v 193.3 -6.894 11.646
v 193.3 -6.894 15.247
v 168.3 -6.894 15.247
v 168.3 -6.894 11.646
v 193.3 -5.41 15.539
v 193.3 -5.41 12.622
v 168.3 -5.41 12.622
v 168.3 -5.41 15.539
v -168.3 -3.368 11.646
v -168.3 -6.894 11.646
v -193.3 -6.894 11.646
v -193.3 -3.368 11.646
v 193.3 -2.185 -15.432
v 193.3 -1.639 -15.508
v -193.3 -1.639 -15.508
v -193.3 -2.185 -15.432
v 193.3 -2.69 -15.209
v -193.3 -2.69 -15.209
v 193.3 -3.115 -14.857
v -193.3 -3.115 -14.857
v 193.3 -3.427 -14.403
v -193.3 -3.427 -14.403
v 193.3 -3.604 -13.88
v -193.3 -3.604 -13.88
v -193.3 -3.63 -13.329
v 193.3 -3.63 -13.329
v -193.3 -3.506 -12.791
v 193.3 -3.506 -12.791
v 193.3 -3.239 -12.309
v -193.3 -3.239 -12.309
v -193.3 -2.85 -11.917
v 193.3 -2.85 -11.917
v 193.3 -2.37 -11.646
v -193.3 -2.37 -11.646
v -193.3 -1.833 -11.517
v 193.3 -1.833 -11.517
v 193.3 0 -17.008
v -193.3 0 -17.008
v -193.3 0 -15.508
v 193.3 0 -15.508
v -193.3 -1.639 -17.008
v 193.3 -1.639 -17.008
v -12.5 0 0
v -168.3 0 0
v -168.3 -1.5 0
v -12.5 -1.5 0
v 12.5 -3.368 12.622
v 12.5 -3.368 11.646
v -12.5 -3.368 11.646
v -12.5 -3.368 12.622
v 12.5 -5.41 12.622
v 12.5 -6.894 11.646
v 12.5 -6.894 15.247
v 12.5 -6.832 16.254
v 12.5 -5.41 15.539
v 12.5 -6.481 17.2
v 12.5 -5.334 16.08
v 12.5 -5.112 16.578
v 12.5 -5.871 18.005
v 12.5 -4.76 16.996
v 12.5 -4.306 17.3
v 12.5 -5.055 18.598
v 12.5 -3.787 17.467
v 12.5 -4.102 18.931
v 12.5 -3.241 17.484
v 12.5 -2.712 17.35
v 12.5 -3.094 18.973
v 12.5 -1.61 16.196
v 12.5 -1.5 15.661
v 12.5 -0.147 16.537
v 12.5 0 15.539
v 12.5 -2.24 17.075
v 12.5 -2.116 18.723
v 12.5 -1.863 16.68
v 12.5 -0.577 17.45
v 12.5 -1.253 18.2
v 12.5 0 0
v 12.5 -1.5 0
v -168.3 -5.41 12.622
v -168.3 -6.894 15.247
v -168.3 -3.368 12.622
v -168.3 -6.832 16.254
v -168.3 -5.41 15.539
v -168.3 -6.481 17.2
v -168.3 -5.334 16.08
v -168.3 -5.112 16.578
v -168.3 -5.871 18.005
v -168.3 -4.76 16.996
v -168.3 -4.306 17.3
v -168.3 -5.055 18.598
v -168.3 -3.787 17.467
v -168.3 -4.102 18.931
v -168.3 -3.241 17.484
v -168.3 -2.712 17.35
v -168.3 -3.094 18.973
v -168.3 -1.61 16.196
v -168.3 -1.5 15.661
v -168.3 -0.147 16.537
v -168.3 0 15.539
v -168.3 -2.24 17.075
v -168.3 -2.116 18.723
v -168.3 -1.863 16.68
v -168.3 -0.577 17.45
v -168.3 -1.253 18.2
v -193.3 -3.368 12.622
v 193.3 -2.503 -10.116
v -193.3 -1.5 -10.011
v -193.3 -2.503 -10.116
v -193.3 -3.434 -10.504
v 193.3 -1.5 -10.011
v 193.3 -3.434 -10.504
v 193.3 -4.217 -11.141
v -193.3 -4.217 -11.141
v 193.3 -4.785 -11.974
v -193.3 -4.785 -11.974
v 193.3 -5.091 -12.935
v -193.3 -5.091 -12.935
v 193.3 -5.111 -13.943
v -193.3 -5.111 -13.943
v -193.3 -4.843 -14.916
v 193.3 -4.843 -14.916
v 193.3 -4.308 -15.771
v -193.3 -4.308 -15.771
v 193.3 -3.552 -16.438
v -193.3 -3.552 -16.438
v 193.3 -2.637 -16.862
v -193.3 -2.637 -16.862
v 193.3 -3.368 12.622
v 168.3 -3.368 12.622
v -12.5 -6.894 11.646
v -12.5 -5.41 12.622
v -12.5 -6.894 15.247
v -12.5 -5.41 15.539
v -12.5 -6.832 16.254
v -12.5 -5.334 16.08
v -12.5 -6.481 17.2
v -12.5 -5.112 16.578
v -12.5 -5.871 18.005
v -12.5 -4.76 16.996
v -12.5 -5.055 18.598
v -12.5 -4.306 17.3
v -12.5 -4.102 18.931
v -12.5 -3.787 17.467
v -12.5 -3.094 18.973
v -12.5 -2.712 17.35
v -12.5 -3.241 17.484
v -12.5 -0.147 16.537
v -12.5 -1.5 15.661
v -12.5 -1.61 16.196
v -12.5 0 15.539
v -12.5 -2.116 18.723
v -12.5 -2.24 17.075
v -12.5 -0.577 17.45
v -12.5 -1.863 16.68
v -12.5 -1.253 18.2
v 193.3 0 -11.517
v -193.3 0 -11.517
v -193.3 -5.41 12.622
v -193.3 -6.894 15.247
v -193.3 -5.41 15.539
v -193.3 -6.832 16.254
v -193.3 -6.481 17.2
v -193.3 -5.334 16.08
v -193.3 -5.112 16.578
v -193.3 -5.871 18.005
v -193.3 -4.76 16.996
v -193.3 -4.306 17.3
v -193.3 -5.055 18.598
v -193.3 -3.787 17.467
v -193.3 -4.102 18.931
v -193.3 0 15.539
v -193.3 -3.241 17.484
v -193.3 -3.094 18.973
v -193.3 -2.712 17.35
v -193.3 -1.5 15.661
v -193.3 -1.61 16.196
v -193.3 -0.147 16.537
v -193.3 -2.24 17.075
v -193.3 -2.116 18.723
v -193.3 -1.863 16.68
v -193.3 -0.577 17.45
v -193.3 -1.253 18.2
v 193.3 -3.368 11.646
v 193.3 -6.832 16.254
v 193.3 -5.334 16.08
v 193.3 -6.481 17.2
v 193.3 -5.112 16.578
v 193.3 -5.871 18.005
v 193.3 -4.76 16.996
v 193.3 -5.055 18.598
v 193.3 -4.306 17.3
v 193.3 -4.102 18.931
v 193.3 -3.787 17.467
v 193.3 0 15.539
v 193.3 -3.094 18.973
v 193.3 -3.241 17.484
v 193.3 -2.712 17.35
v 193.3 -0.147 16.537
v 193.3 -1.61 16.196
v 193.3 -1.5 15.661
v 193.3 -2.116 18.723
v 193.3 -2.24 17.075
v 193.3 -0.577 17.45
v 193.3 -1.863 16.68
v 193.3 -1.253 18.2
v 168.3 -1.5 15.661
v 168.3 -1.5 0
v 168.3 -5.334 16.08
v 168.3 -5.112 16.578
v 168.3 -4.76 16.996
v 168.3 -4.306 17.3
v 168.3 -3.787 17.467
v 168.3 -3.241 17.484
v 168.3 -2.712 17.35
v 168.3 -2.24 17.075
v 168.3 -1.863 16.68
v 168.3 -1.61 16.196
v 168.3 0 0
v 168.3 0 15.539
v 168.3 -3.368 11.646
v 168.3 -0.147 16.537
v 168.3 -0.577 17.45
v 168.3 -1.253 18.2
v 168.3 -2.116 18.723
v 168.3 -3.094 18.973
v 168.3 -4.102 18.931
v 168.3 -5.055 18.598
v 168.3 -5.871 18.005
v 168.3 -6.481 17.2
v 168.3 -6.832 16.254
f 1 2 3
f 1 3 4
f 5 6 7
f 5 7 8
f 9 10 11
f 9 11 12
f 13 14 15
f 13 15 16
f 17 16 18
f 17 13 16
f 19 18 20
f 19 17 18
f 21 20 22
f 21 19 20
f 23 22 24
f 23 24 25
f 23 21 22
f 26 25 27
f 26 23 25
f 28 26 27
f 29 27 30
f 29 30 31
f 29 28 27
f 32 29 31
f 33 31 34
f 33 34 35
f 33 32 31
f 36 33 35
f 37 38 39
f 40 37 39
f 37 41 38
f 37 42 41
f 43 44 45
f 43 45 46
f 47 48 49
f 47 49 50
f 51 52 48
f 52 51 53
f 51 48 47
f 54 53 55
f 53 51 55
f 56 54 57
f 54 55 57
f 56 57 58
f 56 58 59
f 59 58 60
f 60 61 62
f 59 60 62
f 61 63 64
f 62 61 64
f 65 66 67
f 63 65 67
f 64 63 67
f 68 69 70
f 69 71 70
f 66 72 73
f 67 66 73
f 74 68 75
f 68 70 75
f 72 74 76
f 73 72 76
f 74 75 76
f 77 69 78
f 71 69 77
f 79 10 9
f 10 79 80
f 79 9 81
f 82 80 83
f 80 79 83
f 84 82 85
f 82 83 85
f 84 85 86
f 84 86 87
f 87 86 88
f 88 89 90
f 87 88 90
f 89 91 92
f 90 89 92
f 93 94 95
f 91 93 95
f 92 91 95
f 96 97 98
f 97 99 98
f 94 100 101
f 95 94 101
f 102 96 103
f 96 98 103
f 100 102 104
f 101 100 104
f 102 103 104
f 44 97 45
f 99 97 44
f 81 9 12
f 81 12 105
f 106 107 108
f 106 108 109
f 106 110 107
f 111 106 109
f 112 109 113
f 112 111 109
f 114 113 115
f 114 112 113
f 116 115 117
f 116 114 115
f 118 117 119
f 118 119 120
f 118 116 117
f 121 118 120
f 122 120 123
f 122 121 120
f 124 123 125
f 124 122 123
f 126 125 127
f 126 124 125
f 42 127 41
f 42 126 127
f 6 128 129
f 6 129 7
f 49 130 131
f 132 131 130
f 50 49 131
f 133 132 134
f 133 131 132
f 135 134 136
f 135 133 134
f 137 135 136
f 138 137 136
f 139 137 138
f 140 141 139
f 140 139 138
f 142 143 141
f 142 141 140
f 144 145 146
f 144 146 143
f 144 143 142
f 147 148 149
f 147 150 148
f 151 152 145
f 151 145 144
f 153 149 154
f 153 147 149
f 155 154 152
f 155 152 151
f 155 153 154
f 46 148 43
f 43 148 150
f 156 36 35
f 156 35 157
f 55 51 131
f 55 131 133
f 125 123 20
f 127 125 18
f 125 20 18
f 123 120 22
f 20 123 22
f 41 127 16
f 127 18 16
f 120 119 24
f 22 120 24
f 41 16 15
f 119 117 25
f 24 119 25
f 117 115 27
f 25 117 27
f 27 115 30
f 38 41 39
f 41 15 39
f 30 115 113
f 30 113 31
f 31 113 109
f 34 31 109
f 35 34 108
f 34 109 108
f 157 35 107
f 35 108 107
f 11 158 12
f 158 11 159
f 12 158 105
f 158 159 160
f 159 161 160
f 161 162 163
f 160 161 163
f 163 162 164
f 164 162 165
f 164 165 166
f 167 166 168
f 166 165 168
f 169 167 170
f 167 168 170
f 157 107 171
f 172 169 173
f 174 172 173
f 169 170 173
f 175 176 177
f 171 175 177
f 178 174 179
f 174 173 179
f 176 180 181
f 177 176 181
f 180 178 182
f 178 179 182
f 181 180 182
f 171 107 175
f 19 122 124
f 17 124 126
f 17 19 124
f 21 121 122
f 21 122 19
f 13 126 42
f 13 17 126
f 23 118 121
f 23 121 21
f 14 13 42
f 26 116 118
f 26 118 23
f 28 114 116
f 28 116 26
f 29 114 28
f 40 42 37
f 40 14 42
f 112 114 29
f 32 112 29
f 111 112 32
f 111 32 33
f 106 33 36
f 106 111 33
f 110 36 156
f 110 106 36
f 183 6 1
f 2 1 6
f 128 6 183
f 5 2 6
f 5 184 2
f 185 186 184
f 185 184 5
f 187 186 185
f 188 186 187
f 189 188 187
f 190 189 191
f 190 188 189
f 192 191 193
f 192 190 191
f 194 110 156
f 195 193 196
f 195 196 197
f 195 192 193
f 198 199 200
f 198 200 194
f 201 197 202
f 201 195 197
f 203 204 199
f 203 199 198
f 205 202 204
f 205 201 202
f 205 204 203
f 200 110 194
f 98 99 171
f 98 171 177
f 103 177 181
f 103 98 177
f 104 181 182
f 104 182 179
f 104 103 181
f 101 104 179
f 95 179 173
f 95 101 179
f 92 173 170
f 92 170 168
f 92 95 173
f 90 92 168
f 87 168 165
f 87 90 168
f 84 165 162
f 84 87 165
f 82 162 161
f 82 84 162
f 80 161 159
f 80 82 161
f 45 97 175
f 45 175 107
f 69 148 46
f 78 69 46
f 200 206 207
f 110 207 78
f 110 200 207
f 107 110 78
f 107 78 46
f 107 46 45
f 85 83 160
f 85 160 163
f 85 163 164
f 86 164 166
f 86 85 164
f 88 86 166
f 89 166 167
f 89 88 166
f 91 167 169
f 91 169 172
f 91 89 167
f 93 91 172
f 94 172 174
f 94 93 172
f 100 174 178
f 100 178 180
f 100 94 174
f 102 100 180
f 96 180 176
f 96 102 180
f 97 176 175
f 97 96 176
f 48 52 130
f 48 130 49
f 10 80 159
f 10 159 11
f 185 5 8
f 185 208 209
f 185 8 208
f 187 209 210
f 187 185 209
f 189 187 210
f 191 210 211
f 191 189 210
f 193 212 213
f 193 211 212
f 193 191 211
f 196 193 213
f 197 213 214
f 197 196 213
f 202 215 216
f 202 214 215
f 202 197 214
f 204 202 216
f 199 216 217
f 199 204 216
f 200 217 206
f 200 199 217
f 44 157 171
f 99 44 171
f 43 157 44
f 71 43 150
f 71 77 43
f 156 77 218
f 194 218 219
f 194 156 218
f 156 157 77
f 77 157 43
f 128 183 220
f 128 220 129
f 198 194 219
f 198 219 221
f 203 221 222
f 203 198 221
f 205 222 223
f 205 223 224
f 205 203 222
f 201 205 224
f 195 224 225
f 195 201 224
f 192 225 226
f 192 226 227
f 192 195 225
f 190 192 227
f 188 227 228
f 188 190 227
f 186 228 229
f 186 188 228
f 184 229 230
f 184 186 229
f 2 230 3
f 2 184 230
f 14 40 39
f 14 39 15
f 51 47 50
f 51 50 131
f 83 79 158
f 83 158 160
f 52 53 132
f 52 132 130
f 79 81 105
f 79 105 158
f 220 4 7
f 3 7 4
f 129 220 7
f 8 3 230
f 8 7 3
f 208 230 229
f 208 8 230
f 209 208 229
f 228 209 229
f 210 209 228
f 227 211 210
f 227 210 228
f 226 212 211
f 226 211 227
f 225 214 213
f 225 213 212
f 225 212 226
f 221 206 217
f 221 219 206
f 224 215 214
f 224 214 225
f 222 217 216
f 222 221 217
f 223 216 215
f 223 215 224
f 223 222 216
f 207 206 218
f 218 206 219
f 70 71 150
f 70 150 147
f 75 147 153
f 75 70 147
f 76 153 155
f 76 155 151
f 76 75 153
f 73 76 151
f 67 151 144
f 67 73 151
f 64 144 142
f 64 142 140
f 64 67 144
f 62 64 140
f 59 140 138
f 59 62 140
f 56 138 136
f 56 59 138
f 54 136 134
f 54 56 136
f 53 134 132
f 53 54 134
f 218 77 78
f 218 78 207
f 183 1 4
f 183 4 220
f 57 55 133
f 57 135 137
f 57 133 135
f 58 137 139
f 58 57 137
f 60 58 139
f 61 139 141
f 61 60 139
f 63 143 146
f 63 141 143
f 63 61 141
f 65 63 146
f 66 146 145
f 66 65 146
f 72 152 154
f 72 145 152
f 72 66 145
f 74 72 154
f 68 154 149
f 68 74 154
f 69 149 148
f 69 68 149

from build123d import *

# Parameters (mm, degrees)
F1_DEPTH      = 193.3
F2_W          = 155.8
F2_H          = 27.6261721705
F2_H_2        = 29.0520395572
F3_DEPTH      = 392
F3_DEPTH_BACK = 6.9075074824


# Not quite as in the source:
# - an extrude ends at something that could not be found from the text; its depth is read off the source's solid


with BuildPart() as f1:
    # F0 (on Right) → F1 (new body, symmetric)
    with BuildSketch(Plane.YZ):
        with BuildLine():
            Line((0, -17.0077651882), (0, -15.5077651882))
            Line((0, -15.5077651882), (-1.6385802936, -15.5077651882))
            ThreePointArc((-1.6385802936, -15.5077651882), (-3.6361192163, -13.605291718), (-1.8332301129, -11.5174320644))
            Line((-1.8332301129, -11.5174320644), (0, -11.5174320644))
            Line((0, -11.5174320644), (0, 15.5389810706))
            ThreePointArc((0, 15.5389810706), (-3.59937308, 18.9891420146), (-6.8941418337, 15.2470041272))
            Line((-6.8941418337, 15.2470041272), (-6.8941418337, 11.6459712901))
            Line((-6.8941418337, 11.6459712901), (-3.368163947, 11.6459712901))
            Line((-3.368163947, 11.6459712901), (-3.368163947, 12.6215412629))
            Line((-3.368163947, 12.6215412629), (-5.4103266448, 12.6215412629))
            Line((-5.4103266448, 12.6215412629), (-5.4103266448, 15.5389810706))
            ThreePointArc((-5.4103266448, 15.5389810706), (-3.5143862992, 17.4950989506), (-1.5, 15.661186523))
            Line((-1.5, 15.661186523), (-1.5, -10.0106816226))
            ThreePointArc((-1.5, -10.0106816226), (-5.1378081699, -13.4385473486), (-1.6385802936, -17.0077651882))
            Line((-1.6385802936, -17.0077651882), (0, -17.0077651882))
        make_face()
    extrude(amount=F1_DEPTH, both=True)

    # F2 (on Front) → F3 (cut, two sides)
    with BuildSketch(Plane.XZ) as f3_sk:
        with Locations((-90.4, 13.8130860853)):
            Rectangle(F2_W, F2_H)
        with Locations((90.4, 14.5260197786)):
            Rectangle(F2_W, F2_H_2)
    extrude(amount=-F3_DEPTH, mode=Mode.SUBTRACT)
    extrude(f3_sk.sketch, amount=F3_DEPTH_BACK, mode=Mode.SUBTRACT)


solid = f1.part
